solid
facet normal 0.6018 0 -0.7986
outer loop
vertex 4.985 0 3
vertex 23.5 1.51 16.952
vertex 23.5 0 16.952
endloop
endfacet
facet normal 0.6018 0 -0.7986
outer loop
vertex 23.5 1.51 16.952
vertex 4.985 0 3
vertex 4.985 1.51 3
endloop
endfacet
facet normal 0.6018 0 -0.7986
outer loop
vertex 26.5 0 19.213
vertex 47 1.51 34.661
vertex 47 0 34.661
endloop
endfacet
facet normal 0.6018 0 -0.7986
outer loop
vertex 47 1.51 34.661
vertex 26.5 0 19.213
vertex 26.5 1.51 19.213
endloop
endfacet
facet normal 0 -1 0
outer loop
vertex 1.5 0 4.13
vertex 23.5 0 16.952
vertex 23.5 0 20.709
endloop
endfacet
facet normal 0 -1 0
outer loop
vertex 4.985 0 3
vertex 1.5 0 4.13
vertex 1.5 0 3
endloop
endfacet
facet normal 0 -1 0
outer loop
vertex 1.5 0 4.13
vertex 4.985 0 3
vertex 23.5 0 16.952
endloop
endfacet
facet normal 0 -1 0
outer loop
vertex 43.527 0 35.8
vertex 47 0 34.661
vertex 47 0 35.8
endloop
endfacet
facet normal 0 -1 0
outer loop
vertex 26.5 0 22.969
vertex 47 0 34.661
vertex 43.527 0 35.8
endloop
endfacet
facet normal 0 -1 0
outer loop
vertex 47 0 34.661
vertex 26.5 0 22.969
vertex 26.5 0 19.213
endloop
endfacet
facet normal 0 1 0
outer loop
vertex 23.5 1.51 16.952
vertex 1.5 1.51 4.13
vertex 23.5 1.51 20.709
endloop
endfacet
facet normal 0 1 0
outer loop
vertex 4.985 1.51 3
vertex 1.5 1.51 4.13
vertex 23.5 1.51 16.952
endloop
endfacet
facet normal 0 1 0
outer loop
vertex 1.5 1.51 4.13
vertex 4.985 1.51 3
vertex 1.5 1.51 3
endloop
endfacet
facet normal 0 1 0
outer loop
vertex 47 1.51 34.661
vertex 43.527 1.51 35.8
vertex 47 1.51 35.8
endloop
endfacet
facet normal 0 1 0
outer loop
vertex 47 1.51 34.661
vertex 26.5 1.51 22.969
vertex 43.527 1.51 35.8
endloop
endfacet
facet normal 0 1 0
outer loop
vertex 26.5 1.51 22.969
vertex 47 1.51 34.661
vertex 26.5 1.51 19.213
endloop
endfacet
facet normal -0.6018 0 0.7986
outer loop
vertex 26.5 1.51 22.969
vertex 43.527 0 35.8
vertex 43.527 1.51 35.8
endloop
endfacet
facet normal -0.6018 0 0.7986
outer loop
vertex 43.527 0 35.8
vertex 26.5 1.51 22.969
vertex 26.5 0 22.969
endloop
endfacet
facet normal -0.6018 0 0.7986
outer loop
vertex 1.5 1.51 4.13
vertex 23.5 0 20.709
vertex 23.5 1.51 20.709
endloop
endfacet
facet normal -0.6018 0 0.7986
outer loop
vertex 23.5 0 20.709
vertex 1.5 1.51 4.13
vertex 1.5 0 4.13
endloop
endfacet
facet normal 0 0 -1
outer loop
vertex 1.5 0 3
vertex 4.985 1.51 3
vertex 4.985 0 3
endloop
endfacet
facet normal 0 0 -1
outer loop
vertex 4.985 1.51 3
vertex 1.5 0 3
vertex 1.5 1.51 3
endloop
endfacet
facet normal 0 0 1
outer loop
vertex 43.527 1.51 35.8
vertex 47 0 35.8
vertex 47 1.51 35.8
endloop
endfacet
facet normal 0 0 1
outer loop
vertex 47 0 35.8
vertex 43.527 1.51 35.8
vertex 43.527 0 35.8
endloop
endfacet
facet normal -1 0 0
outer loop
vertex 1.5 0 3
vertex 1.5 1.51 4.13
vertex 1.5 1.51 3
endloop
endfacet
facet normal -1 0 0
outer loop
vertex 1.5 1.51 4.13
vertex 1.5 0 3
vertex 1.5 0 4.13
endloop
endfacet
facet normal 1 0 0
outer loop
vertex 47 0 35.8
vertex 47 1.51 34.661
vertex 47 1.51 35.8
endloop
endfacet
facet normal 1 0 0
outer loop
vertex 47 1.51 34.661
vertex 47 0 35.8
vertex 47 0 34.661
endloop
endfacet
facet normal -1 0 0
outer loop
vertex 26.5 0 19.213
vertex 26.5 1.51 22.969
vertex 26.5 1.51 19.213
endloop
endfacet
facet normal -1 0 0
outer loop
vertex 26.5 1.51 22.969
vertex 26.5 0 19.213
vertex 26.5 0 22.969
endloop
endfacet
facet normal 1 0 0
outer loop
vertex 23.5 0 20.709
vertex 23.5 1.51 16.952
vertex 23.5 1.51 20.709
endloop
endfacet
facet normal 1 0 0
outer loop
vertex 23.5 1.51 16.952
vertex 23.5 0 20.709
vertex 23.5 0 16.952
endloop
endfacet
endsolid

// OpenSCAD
module stucco(x) {
    color("Cornsilk") translate([0,1.5+25*x-10.2,0]) cube([25*x-1.5,7.2,38.8]);
    color("Cornsilk") translate([1.5+25*x-10.2,0,0]) cube([7.2,25*x-1.5,38.8]);
}

module corner_frame(x,slash=false,reverse_slash=false,cross_beam=false) {
    thickness = 1.51;
    color("SaddleBrown") {
        translate([0,25*x-10.2,0]) cube([25*x-10.2,thickness,3]);
        translate([0,25*x-10.2,38.8-3]) cube([25*x-10.2,thickness,3]);
        translate([0,25*x-10.2,3]) cube([1.5,thickness,38.8-6]);
        translate([25*x-10.2,25*x-10.2,0]) cube([1.5,thickness,38.8]);

        translate([0,25*x-1.5,0]) cube([25*x-3,thickness,3]);
        translate([0,25*x-1.5,38.8-3]) cube([25*x-3,thickness,3]);
        translate([0,25*x-1.5,3]) cube([1.5,thickness,38.8-6]);
        translate([25*x-3,25*x-1.5,0]) cube([3,thickness,38.8]);

        translate([25*x-10.2,0,0]) cube([thickness,25*x-10.2,3]);
        translate([25*x-10.2,0,38.8-3]) cube([thickness,25*x-10.2,3]);
        translate([25*x-10.2,0,3]) cube([thickness,1.5,38.8-6]);
        translate([25*x-10.2,25*x-10.2,0]) cube([thickness,1.5,38.8]);

        translate([25*x-1.5,0,0]) cube([thickness,25*x-3,3]);
        translate([25*x-1.5,0,38.8-3]) cube([thickness,25*x-3,3]);
        translate([25*x-1.5,0,3]) cube([thickness,1.5,38.8-6]);
        translate([25*x-1.5,25*x-3,0]) cube([thickness,1.5,38.8]);

        for (i = [1:(x-1)]) {
            translate([25*i-1.5,25*x-10.2,3]) cube([3,thickness,38.8-6]);
            translate([25*i-1.5,25*x-1.5,3]) cube([3,thickness,38.8-6]);
            translate([25*x-10.2,25*i-1.5,3]) cube([thickness,3,38.8-6]);
            translate([25*x-1.5,25*i-1.5,3]) cube([thickness,3,38.8-6]);
        }
        for (i = [1:x]) {
            if (slash) {
                if(i%2 == 0) {
                     translate([25*(i-1),0,3]) rotate([0,-57,0]) mirror([0,0,1]) cube([41,thickness,3]);
                } else {
                     translate([25*(i-1),0,38.8-3]) rotate([0,57,0]) cube([41,thickness,3]);
                }
            }
            if (reverse_slash) {
                if(i%2 == 0) {
                     translate([25*(i-1),0,38.8-3]) rotate([0,57,0]) cube([41,thickness,3]);
                     // Double
                     //translate([25*(i-1),0,38.8-3]) rotate([0,36,0]) cube([59,thickness,3]);
                } else {
                     translate([25*(i-1),0,3]) rotate([0,-57,0]) mirror([0,0,1]) cube([41,thickness,3]);
                     // Double
                     // translate([25*(i-1),0,3]) rotate([0,-36,0]) mirror([0,0,1]) cube([59,thickness,3]);
                }
            }
            if (cross_beam) {
                translate([25*(i-1)+1.5,0,38.8/3+1]) cube([25-3,thickness,3]);
            }
        }
    }
}

/*
stucco(2);
corner_frame(2,slash=false,reverse_slash=false,cross_beam=false);
translate([0,10.2-1.5,0]) wall_frame(2, slash=true);
*/
thickness = 1.51;
x=2;



difference() {
        translate([0,0,3]) rotate([0,-37,0]) mirror([0,0,1]) cube([58,thickness,3]);

        translate([0,-.1,0]) cube([25*x,thickness+.2,3]);
        translate([0,-.1,38.8-3]) cube([25*x,thickness+.2,3]);
        translate([0,-.1,3-.1]) cube([1.5,thickness+.2,38.8-6+.2]);
        translate([25*x-3,-.1,3-.1]) cube([1.5,thickness+.2,38.8-6+.2]);
    if (x > 1) {
        for (i = [1:(x-1)]) {
            translate([25*i-1.5,-.1,3-.1]) cube([3,thickness+.2,38.8-6]);
        }
    }
}
